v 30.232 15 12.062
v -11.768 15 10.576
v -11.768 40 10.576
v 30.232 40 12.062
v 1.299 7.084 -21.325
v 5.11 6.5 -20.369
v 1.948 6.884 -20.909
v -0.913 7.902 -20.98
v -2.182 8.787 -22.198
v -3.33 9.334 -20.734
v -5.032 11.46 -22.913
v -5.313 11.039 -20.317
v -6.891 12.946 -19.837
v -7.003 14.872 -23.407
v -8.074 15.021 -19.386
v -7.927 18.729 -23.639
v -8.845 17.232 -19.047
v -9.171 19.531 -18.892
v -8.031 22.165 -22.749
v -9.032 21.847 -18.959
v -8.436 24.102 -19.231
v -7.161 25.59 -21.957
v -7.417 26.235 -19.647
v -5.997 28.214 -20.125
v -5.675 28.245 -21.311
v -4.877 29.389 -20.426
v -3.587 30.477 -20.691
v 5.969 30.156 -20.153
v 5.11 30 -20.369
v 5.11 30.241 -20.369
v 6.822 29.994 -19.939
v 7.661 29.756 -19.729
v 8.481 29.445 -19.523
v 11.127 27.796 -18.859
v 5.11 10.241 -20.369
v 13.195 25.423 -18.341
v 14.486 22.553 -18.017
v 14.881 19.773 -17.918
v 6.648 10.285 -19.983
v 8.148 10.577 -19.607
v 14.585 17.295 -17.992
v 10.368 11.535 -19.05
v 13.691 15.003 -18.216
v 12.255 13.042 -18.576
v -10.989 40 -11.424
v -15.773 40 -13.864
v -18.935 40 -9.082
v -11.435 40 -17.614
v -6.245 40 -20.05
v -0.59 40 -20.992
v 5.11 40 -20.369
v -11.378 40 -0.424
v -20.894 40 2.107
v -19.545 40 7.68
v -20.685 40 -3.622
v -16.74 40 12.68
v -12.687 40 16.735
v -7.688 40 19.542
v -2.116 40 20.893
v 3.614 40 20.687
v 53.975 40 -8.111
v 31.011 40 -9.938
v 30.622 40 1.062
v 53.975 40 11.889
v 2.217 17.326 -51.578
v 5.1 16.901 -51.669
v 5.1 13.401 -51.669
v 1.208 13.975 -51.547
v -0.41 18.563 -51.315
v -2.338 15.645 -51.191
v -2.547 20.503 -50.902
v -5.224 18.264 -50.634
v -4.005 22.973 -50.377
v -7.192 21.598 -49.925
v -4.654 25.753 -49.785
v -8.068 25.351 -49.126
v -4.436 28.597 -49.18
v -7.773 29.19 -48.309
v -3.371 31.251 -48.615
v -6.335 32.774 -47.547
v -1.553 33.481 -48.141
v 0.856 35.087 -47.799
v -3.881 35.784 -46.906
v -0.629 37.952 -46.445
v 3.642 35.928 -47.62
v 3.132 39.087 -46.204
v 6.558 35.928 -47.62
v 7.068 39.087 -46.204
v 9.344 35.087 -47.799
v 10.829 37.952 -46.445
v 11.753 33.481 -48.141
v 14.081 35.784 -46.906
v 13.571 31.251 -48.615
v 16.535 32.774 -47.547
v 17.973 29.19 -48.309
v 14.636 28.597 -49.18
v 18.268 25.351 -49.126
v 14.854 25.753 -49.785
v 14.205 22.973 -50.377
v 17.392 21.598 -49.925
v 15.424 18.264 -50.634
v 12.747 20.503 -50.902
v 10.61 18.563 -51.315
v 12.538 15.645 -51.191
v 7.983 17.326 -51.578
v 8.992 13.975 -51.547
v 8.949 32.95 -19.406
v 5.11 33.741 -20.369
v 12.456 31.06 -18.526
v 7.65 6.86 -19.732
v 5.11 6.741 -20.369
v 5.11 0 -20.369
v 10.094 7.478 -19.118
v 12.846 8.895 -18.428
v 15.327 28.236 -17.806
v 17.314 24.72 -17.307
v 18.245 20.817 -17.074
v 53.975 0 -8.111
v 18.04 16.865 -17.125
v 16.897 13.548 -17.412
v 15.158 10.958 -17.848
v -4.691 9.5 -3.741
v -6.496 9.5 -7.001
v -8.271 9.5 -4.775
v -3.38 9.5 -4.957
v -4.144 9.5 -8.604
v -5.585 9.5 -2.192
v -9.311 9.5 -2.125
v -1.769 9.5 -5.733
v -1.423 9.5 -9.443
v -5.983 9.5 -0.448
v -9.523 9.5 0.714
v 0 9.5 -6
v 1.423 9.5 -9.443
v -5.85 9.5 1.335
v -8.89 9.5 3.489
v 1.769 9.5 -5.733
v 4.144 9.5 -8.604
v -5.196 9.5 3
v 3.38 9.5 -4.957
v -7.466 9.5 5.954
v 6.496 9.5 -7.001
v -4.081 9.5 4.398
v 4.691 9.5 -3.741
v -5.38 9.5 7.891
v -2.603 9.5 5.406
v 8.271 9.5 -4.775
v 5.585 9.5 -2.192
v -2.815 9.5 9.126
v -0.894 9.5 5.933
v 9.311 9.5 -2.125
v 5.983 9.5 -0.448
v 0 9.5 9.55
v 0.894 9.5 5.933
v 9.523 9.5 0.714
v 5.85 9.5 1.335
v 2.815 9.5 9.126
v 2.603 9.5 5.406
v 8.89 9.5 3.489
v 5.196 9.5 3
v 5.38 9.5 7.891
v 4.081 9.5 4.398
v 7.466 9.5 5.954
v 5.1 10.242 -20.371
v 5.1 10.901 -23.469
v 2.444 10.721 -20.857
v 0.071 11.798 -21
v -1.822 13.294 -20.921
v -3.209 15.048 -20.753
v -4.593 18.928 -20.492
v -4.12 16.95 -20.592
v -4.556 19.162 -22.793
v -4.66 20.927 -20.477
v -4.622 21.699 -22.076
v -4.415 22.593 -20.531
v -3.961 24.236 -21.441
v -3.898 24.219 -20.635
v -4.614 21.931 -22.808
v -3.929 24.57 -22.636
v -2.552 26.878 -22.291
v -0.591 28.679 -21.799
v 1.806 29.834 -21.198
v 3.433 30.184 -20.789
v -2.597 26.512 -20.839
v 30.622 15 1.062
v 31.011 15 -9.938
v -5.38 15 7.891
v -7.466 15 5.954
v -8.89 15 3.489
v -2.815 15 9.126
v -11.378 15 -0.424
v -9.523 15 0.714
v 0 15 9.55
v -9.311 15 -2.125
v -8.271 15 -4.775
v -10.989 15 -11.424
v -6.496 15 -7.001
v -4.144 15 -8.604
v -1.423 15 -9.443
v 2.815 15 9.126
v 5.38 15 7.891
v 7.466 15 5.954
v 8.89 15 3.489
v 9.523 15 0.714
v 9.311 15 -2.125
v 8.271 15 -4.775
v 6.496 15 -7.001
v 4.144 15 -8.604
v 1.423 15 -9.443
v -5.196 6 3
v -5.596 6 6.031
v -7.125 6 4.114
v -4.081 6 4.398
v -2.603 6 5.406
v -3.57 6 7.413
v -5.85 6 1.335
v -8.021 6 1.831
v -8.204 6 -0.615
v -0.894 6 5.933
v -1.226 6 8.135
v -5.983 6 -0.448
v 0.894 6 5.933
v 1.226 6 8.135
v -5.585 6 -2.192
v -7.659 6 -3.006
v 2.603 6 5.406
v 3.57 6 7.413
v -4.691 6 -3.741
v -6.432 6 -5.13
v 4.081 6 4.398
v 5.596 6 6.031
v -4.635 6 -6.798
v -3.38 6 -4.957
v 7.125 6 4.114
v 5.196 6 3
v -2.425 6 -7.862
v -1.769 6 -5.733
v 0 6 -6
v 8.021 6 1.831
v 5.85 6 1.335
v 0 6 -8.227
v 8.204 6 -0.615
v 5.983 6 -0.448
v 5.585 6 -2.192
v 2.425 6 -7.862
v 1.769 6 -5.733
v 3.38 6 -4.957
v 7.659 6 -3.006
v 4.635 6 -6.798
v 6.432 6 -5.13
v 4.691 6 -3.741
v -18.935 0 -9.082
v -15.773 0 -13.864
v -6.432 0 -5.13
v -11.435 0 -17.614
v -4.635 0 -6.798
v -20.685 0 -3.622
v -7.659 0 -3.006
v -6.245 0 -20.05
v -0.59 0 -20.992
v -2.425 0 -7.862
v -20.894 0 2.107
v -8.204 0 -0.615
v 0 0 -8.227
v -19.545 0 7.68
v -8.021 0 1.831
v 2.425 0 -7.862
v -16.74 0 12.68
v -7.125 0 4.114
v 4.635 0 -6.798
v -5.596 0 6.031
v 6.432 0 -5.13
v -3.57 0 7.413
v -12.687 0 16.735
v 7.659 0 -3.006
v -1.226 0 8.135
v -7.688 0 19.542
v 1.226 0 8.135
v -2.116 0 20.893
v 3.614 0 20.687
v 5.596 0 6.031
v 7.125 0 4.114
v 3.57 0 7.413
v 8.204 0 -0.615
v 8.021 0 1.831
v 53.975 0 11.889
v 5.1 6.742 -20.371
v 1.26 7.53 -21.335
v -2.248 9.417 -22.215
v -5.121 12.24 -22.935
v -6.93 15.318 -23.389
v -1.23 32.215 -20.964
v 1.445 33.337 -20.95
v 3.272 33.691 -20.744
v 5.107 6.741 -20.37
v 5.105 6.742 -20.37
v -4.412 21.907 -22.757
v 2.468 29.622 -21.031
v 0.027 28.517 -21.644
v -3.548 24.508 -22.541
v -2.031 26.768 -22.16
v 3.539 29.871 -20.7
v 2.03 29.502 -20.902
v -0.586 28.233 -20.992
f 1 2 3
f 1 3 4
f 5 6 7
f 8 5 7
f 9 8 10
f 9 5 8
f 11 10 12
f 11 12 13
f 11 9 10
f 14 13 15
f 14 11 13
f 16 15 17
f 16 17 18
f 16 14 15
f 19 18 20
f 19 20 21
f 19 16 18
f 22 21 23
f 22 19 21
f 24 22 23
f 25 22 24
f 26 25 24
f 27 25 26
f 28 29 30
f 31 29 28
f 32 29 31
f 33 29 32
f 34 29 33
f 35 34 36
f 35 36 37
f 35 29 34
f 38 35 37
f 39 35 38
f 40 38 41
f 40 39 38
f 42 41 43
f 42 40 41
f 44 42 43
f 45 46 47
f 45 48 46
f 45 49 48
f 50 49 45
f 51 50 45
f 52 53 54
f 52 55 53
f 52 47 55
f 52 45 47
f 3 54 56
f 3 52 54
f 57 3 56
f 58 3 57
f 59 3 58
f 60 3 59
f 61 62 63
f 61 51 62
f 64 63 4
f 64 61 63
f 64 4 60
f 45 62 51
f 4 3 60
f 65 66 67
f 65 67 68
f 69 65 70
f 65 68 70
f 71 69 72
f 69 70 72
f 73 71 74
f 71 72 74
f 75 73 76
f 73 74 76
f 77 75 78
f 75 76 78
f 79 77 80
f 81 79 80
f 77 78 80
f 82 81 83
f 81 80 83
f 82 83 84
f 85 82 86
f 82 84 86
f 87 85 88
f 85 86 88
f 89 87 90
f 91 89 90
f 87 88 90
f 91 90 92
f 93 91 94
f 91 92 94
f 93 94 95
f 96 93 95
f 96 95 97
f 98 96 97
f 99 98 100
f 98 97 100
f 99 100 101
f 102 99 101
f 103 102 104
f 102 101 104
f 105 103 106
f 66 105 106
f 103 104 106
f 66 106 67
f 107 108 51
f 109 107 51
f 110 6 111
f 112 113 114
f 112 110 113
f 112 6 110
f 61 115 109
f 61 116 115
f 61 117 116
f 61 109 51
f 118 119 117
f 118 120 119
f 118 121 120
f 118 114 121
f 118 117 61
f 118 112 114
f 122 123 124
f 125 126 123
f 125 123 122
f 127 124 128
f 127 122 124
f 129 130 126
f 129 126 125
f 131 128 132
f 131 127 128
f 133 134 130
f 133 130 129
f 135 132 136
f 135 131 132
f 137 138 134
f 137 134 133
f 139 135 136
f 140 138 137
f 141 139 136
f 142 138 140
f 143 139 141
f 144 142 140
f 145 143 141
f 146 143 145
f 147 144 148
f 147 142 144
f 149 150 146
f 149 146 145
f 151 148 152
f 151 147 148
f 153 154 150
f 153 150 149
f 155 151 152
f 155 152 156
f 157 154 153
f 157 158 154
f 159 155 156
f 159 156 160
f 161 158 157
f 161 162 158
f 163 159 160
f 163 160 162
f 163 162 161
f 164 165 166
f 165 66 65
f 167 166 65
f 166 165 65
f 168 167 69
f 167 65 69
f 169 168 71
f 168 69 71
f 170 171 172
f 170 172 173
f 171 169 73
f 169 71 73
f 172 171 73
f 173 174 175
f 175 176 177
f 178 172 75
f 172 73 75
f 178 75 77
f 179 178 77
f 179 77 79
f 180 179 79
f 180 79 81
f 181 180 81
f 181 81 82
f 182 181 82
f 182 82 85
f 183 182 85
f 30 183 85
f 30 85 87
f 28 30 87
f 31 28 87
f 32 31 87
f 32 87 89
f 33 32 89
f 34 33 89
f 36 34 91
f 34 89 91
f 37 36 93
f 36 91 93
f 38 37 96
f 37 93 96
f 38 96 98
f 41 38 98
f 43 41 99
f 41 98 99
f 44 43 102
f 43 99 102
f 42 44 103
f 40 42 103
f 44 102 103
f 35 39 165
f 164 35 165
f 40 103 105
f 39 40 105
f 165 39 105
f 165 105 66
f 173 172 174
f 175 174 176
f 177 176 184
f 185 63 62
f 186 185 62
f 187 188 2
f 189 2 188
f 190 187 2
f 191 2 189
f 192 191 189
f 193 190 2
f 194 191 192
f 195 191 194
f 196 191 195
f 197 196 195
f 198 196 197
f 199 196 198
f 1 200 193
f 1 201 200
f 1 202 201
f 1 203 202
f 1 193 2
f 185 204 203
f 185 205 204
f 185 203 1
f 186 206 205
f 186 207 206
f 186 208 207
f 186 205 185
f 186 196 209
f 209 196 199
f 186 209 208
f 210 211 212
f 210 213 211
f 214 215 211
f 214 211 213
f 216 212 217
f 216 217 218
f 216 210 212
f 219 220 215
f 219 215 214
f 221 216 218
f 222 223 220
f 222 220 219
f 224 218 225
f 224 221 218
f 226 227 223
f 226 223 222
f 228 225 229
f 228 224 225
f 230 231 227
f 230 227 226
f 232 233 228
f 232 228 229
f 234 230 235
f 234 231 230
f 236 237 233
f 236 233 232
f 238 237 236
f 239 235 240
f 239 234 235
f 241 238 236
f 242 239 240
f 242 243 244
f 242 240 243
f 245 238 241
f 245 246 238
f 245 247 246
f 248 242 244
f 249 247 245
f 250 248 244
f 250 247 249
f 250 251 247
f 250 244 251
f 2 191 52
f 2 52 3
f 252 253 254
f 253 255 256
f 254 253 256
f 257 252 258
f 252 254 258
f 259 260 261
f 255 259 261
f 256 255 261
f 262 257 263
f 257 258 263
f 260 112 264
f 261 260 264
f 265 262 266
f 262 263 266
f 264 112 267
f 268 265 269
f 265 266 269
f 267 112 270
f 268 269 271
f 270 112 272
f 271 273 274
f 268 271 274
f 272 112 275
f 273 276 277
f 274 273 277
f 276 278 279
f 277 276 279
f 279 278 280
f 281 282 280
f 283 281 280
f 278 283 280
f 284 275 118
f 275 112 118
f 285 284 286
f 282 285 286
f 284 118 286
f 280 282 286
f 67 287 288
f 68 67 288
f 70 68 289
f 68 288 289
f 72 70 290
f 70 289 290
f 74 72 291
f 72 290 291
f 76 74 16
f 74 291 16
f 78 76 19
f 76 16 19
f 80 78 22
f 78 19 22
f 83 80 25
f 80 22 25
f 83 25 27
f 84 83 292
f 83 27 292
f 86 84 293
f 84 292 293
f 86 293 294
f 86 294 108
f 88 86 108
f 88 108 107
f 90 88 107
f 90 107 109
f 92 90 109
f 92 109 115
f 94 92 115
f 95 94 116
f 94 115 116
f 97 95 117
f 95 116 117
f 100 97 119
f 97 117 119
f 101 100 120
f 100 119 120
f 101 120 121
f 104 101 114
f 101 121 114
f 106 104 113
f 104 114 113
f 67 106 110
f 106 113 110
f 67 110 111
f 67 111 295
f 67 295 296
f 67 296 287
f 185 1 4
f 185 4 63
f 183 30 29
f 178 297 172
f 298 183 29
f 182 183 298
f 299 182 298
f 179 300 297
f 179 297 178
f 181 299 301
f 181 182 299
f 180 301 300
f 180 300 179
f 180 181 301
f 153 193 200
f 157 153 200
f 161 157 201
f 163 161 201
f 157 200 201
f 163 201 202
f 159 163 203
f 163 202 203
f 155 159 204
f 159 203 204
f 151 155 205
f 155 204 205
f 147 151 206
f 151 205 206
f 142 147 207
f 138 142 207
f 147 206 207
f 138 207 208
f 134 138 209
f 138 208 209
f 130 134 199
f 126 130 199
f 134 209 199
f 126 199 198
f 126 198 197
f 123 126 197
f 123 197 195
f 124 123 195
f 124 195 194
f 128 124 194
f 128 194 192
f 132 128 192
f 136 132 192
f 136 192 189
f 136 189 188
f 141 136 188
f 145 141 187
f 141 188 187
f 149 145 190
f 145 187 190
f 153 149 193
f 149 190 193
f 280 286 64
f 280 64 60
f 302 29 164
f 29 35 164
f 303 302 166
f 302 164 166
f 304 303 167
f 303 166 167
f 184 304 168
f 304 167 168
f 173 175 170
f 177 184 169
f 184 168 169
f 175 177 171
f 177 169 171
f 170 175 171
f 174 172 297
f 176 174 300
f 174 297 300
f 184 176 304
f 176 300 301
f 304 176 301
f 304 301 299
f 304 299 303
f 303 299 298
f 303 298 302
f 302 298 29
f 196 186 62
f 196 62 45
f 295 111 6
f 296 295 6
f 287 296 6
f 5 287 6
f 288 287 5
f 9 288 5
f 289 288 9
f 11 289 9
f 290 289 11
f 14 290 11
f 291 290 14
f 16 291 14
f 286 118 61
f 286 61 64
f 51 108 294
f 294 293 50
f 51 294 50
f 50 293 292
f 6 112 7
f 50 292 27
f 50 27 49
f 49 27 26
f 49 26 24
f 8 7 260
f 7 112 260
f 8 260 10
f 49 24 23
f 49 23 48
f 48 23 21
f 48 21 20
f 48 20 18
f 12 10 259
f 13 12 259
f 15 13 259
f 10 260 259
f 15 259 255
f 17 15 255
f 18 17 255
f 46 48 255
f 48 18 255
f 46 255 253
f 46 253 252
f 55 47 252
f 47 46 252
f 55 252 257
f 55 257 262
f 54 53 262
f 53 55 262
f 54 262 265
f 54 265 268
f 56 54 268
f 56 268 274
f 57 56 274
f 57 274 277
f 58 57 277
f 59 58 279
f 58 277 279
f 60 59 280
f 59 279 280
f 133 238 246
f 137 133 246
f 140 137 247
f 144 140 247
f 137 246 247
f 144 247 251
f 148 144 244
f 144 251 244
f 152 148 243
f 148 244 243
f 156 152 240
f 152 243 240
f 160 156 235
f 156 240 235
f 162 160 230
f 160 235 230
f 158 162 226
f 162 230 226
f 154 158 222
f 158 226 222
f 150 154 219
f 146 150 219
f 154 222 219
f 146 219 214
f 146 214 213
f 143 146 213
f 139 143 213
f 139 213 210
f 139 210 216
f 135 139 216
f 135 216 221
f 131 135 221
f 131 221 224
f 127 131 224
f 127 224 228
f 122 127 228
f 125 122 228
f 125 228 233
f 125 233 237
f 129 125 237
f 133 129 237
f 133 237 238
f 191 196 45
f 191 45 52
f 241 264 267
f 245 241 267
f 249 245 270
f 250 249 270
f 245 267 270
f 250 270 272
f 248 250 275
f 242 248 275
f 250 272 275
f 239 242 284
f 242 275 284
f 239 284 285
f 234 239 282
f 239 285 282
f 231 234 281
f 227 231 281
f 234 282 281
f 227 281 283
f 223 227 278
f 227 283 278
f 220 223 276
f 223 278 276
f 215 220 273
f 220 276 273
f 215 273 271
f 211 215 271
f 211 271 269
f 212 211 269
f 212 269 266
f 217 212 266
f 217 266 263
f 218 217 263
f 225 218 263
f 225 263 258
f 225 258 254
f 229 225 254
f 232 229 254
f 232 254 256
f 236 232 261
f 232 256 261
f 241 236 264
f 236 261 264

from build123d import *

# Parameters (mm, degrees)
CROQUIS1_R              = 21
SALIENTE_EXTRUIR1_DEPTH = 40
SALIENTE_EXTRUIR2_DEPTH = 40
SALIENTE_EXTRUIR3_REACH = 77.493
CROQUIS3_R              = 13.5
CROQUIS3_R_2            = 10
CROQUIS7_R              = 8.227269221
CROQUIS7_R_2            = 6
CORTAR_EXTRUIR6_DEPTH   = 6
CROQUIS8_R              = 6
CORTAR_EXTRUIR7_DEPTH   = 72.223648425
CORTAR_EXTRUIR8_START   = -25
CORTAR_EXTRUIR8_DEPTH   = 25
CROQUIS12_R             = 9.55
CORTAR_EXTRUIR9_DEPTH   = 5.5


with BuildPart() as part:
    # Croquis1 → Saliente-Extruir1 (new body)
    with BuildSketch(Plane(origin=(0, 0, 0), x_dir=(1, 0, 0), z_dir=(0, 1, 0))):
        with Locations(Location((0, 0, 0), (0, 0, 270))):
            Circle(CROQUIS1_R)
    extrude(amount=SALIENTE_EXTRUIR1_DEPTH)

    # Croquis2 → Saliente-Extruir2 (add)
    with BuildSketch(Plane(origin=(0, 0, 0), x_dir=(1, 0, 0), z_dir=(0, 1, 0))):
        with BuildLine():
            Line((53.975127576, 8.110971331), (53.975127576, -11.889028669))
            Line((53.975127576, -11.889028669), (3.613793412, -20.686722727))
            ThreePointArc((3.613793412, -20.686722727), (20.98607707, -0.764571273), (5.109545014, 20.368911354))
            Line((5.109545014, 20.368911354), (53.975127576, 8.110971331))
        make_face()
    extrude(amount=SALIENTE_EXTRUIR2_DEPTH)

    # Croquis3 → Saliente-Extruir3 (add, up to next)
    with BuildSketch(Plane(origin=(5.109545014, 0, -20.368911354), x_dir=(-0.9699481597219111, 0, -0.24331166731597212), z_dir=(0.2433116673159721, 0, -0.969948159721911)), mode=Mode.PRIVATE) as saliente_extruir3_sk1:
        with Locations((0, 20)):
            Circle(CROQUIS3_R)
        with Locations((0, 20)):
            Circle(CROQUIS3_R_2, mode=Mode.SUBTRACT)
    saliente_extruir3_tool1 = extrude(saliente_extruir3_sk1.sketch, amount=-SALIENTE_EXTRUIR3_REACH, mode=Mode.PRIVATE) - part.part
    add(saliente_extruir3_tool1.solids().sort_by_distance((17.833482, 20, -17.177109))[0])

    # Croquis7 → Cortar-Extruir6 (cut)
    with BuildSketch(Plane.XZ):
        with Locations(Location((0, 0, 0), (0, 0, 270))):
            Circle(CROQUIS7_R)
        with Locations(Location((0, 0, 0), (0, 0, 270))):
            Circle(CROQUIS7_R_2, mode=Mode.SUBTRACT)
    extrude(amount=-CORTAR_EXTRUIR6_DEPTH, mode=Mode.SUBTRACT)

    # Croquis8 → Cortar-Extruir7 (cut, through all)
    with BuildSketch(Plane.XZ):
        with Locations(Location((0, 0, 0), (0, 0, 270))):
            Circle(CROQUIS8_R)
    extrude(amount=-CORTAR_EXTRUIR7_DEPTH, mode=Mode.SUBTRACT)

    # Croquis10 → Cortar-Extruir8 (cut)
    with BuildSketch(Plane(origin=(0, 40, 0), x_dir=(1, 0, 0), z_dir=(0, 1, 0)).offset(CORTAR_EXTRUIR8_START)):
        with BuildLine():
            Line((-5.995438853, 0.23390802), (-11.37823559, 0.424457107))
            Line((-11.37823559, 0.424457107), (-11.767631672, -10.575542893))
            Line((-11.767631672, -10.575542893), (30.232368328, -12.062327932))
            Line((30.232368328, -12.062327932), (30.62176441, -1.062327932))
            Line((30.62176441, -1.062327932), (5.996971268, -0.190619027))
            ThreePointArc((5.996971268, -0.190619027), (-0.212264906, -5.996244125), (-5.995438853, 0.23390802))
        make_face()
        with BuildLine():
            Line((-10.988839509, 11.424457107), (-11.37823559, 0.424457107))
            Line((-11.37823559, 0.424457107), (-5.995438853, 0.23390802))
            ThreePointArc((-5.995438853, 0.23390802), (0.116976243, 5.998859605), (6, 0))
            ThreePointArc((6, 0), (5.999242769, -0.095321543), (5.996971268, -0.190619027))
            Line((5.996971268, -0.190619027), (30.62176441, -1.062327932))
            Line((30.62176441, -1.062327932), (31.011160491, 9.937672068))
            Line((31.011160491, 9.937672068), (-10.988839509, 11.424457107))
        make_face()
    extrude(amount=CORTAR_EXTRUIR8_DEPTH, mode=Mode.SUBTRACT)

    # Croquis12 → Cortar-Extruir9 (cut)
    with BuildSketch(Plane(origin=(0, 15, 0), x_dir=(1, 0, 0), z_dir=(0, 1, 0))):
        with Locations(Location((0, 0, 0), (0, 0, 270))):
            Circle(CROQUIS12_R)
    extrude(amount=-CORTAR_EXTRUIR9_DEPTH, mode=Mode.SUBTRACT)

    # Croquis4 → Revolución2 (revolve)
    with BuildSketch(Plane(origin=(5.1, 0, 0), x_dir=(0, 0, -1), z_dir=(1, 0, 0))):
        Polygon((23.468699932, 10.900780306), (51.668699932, 16.900780306), (51.668699932, 13.400780306), (16.629031587, 5.945531722), (16.629031587, 9.445531722), align=None)
    revolve(axis=Axis((5.1, 20.900780306, -23.468699932), (0, 0.20810764446485977, -0.9781059289848353)))


solid = part.part
